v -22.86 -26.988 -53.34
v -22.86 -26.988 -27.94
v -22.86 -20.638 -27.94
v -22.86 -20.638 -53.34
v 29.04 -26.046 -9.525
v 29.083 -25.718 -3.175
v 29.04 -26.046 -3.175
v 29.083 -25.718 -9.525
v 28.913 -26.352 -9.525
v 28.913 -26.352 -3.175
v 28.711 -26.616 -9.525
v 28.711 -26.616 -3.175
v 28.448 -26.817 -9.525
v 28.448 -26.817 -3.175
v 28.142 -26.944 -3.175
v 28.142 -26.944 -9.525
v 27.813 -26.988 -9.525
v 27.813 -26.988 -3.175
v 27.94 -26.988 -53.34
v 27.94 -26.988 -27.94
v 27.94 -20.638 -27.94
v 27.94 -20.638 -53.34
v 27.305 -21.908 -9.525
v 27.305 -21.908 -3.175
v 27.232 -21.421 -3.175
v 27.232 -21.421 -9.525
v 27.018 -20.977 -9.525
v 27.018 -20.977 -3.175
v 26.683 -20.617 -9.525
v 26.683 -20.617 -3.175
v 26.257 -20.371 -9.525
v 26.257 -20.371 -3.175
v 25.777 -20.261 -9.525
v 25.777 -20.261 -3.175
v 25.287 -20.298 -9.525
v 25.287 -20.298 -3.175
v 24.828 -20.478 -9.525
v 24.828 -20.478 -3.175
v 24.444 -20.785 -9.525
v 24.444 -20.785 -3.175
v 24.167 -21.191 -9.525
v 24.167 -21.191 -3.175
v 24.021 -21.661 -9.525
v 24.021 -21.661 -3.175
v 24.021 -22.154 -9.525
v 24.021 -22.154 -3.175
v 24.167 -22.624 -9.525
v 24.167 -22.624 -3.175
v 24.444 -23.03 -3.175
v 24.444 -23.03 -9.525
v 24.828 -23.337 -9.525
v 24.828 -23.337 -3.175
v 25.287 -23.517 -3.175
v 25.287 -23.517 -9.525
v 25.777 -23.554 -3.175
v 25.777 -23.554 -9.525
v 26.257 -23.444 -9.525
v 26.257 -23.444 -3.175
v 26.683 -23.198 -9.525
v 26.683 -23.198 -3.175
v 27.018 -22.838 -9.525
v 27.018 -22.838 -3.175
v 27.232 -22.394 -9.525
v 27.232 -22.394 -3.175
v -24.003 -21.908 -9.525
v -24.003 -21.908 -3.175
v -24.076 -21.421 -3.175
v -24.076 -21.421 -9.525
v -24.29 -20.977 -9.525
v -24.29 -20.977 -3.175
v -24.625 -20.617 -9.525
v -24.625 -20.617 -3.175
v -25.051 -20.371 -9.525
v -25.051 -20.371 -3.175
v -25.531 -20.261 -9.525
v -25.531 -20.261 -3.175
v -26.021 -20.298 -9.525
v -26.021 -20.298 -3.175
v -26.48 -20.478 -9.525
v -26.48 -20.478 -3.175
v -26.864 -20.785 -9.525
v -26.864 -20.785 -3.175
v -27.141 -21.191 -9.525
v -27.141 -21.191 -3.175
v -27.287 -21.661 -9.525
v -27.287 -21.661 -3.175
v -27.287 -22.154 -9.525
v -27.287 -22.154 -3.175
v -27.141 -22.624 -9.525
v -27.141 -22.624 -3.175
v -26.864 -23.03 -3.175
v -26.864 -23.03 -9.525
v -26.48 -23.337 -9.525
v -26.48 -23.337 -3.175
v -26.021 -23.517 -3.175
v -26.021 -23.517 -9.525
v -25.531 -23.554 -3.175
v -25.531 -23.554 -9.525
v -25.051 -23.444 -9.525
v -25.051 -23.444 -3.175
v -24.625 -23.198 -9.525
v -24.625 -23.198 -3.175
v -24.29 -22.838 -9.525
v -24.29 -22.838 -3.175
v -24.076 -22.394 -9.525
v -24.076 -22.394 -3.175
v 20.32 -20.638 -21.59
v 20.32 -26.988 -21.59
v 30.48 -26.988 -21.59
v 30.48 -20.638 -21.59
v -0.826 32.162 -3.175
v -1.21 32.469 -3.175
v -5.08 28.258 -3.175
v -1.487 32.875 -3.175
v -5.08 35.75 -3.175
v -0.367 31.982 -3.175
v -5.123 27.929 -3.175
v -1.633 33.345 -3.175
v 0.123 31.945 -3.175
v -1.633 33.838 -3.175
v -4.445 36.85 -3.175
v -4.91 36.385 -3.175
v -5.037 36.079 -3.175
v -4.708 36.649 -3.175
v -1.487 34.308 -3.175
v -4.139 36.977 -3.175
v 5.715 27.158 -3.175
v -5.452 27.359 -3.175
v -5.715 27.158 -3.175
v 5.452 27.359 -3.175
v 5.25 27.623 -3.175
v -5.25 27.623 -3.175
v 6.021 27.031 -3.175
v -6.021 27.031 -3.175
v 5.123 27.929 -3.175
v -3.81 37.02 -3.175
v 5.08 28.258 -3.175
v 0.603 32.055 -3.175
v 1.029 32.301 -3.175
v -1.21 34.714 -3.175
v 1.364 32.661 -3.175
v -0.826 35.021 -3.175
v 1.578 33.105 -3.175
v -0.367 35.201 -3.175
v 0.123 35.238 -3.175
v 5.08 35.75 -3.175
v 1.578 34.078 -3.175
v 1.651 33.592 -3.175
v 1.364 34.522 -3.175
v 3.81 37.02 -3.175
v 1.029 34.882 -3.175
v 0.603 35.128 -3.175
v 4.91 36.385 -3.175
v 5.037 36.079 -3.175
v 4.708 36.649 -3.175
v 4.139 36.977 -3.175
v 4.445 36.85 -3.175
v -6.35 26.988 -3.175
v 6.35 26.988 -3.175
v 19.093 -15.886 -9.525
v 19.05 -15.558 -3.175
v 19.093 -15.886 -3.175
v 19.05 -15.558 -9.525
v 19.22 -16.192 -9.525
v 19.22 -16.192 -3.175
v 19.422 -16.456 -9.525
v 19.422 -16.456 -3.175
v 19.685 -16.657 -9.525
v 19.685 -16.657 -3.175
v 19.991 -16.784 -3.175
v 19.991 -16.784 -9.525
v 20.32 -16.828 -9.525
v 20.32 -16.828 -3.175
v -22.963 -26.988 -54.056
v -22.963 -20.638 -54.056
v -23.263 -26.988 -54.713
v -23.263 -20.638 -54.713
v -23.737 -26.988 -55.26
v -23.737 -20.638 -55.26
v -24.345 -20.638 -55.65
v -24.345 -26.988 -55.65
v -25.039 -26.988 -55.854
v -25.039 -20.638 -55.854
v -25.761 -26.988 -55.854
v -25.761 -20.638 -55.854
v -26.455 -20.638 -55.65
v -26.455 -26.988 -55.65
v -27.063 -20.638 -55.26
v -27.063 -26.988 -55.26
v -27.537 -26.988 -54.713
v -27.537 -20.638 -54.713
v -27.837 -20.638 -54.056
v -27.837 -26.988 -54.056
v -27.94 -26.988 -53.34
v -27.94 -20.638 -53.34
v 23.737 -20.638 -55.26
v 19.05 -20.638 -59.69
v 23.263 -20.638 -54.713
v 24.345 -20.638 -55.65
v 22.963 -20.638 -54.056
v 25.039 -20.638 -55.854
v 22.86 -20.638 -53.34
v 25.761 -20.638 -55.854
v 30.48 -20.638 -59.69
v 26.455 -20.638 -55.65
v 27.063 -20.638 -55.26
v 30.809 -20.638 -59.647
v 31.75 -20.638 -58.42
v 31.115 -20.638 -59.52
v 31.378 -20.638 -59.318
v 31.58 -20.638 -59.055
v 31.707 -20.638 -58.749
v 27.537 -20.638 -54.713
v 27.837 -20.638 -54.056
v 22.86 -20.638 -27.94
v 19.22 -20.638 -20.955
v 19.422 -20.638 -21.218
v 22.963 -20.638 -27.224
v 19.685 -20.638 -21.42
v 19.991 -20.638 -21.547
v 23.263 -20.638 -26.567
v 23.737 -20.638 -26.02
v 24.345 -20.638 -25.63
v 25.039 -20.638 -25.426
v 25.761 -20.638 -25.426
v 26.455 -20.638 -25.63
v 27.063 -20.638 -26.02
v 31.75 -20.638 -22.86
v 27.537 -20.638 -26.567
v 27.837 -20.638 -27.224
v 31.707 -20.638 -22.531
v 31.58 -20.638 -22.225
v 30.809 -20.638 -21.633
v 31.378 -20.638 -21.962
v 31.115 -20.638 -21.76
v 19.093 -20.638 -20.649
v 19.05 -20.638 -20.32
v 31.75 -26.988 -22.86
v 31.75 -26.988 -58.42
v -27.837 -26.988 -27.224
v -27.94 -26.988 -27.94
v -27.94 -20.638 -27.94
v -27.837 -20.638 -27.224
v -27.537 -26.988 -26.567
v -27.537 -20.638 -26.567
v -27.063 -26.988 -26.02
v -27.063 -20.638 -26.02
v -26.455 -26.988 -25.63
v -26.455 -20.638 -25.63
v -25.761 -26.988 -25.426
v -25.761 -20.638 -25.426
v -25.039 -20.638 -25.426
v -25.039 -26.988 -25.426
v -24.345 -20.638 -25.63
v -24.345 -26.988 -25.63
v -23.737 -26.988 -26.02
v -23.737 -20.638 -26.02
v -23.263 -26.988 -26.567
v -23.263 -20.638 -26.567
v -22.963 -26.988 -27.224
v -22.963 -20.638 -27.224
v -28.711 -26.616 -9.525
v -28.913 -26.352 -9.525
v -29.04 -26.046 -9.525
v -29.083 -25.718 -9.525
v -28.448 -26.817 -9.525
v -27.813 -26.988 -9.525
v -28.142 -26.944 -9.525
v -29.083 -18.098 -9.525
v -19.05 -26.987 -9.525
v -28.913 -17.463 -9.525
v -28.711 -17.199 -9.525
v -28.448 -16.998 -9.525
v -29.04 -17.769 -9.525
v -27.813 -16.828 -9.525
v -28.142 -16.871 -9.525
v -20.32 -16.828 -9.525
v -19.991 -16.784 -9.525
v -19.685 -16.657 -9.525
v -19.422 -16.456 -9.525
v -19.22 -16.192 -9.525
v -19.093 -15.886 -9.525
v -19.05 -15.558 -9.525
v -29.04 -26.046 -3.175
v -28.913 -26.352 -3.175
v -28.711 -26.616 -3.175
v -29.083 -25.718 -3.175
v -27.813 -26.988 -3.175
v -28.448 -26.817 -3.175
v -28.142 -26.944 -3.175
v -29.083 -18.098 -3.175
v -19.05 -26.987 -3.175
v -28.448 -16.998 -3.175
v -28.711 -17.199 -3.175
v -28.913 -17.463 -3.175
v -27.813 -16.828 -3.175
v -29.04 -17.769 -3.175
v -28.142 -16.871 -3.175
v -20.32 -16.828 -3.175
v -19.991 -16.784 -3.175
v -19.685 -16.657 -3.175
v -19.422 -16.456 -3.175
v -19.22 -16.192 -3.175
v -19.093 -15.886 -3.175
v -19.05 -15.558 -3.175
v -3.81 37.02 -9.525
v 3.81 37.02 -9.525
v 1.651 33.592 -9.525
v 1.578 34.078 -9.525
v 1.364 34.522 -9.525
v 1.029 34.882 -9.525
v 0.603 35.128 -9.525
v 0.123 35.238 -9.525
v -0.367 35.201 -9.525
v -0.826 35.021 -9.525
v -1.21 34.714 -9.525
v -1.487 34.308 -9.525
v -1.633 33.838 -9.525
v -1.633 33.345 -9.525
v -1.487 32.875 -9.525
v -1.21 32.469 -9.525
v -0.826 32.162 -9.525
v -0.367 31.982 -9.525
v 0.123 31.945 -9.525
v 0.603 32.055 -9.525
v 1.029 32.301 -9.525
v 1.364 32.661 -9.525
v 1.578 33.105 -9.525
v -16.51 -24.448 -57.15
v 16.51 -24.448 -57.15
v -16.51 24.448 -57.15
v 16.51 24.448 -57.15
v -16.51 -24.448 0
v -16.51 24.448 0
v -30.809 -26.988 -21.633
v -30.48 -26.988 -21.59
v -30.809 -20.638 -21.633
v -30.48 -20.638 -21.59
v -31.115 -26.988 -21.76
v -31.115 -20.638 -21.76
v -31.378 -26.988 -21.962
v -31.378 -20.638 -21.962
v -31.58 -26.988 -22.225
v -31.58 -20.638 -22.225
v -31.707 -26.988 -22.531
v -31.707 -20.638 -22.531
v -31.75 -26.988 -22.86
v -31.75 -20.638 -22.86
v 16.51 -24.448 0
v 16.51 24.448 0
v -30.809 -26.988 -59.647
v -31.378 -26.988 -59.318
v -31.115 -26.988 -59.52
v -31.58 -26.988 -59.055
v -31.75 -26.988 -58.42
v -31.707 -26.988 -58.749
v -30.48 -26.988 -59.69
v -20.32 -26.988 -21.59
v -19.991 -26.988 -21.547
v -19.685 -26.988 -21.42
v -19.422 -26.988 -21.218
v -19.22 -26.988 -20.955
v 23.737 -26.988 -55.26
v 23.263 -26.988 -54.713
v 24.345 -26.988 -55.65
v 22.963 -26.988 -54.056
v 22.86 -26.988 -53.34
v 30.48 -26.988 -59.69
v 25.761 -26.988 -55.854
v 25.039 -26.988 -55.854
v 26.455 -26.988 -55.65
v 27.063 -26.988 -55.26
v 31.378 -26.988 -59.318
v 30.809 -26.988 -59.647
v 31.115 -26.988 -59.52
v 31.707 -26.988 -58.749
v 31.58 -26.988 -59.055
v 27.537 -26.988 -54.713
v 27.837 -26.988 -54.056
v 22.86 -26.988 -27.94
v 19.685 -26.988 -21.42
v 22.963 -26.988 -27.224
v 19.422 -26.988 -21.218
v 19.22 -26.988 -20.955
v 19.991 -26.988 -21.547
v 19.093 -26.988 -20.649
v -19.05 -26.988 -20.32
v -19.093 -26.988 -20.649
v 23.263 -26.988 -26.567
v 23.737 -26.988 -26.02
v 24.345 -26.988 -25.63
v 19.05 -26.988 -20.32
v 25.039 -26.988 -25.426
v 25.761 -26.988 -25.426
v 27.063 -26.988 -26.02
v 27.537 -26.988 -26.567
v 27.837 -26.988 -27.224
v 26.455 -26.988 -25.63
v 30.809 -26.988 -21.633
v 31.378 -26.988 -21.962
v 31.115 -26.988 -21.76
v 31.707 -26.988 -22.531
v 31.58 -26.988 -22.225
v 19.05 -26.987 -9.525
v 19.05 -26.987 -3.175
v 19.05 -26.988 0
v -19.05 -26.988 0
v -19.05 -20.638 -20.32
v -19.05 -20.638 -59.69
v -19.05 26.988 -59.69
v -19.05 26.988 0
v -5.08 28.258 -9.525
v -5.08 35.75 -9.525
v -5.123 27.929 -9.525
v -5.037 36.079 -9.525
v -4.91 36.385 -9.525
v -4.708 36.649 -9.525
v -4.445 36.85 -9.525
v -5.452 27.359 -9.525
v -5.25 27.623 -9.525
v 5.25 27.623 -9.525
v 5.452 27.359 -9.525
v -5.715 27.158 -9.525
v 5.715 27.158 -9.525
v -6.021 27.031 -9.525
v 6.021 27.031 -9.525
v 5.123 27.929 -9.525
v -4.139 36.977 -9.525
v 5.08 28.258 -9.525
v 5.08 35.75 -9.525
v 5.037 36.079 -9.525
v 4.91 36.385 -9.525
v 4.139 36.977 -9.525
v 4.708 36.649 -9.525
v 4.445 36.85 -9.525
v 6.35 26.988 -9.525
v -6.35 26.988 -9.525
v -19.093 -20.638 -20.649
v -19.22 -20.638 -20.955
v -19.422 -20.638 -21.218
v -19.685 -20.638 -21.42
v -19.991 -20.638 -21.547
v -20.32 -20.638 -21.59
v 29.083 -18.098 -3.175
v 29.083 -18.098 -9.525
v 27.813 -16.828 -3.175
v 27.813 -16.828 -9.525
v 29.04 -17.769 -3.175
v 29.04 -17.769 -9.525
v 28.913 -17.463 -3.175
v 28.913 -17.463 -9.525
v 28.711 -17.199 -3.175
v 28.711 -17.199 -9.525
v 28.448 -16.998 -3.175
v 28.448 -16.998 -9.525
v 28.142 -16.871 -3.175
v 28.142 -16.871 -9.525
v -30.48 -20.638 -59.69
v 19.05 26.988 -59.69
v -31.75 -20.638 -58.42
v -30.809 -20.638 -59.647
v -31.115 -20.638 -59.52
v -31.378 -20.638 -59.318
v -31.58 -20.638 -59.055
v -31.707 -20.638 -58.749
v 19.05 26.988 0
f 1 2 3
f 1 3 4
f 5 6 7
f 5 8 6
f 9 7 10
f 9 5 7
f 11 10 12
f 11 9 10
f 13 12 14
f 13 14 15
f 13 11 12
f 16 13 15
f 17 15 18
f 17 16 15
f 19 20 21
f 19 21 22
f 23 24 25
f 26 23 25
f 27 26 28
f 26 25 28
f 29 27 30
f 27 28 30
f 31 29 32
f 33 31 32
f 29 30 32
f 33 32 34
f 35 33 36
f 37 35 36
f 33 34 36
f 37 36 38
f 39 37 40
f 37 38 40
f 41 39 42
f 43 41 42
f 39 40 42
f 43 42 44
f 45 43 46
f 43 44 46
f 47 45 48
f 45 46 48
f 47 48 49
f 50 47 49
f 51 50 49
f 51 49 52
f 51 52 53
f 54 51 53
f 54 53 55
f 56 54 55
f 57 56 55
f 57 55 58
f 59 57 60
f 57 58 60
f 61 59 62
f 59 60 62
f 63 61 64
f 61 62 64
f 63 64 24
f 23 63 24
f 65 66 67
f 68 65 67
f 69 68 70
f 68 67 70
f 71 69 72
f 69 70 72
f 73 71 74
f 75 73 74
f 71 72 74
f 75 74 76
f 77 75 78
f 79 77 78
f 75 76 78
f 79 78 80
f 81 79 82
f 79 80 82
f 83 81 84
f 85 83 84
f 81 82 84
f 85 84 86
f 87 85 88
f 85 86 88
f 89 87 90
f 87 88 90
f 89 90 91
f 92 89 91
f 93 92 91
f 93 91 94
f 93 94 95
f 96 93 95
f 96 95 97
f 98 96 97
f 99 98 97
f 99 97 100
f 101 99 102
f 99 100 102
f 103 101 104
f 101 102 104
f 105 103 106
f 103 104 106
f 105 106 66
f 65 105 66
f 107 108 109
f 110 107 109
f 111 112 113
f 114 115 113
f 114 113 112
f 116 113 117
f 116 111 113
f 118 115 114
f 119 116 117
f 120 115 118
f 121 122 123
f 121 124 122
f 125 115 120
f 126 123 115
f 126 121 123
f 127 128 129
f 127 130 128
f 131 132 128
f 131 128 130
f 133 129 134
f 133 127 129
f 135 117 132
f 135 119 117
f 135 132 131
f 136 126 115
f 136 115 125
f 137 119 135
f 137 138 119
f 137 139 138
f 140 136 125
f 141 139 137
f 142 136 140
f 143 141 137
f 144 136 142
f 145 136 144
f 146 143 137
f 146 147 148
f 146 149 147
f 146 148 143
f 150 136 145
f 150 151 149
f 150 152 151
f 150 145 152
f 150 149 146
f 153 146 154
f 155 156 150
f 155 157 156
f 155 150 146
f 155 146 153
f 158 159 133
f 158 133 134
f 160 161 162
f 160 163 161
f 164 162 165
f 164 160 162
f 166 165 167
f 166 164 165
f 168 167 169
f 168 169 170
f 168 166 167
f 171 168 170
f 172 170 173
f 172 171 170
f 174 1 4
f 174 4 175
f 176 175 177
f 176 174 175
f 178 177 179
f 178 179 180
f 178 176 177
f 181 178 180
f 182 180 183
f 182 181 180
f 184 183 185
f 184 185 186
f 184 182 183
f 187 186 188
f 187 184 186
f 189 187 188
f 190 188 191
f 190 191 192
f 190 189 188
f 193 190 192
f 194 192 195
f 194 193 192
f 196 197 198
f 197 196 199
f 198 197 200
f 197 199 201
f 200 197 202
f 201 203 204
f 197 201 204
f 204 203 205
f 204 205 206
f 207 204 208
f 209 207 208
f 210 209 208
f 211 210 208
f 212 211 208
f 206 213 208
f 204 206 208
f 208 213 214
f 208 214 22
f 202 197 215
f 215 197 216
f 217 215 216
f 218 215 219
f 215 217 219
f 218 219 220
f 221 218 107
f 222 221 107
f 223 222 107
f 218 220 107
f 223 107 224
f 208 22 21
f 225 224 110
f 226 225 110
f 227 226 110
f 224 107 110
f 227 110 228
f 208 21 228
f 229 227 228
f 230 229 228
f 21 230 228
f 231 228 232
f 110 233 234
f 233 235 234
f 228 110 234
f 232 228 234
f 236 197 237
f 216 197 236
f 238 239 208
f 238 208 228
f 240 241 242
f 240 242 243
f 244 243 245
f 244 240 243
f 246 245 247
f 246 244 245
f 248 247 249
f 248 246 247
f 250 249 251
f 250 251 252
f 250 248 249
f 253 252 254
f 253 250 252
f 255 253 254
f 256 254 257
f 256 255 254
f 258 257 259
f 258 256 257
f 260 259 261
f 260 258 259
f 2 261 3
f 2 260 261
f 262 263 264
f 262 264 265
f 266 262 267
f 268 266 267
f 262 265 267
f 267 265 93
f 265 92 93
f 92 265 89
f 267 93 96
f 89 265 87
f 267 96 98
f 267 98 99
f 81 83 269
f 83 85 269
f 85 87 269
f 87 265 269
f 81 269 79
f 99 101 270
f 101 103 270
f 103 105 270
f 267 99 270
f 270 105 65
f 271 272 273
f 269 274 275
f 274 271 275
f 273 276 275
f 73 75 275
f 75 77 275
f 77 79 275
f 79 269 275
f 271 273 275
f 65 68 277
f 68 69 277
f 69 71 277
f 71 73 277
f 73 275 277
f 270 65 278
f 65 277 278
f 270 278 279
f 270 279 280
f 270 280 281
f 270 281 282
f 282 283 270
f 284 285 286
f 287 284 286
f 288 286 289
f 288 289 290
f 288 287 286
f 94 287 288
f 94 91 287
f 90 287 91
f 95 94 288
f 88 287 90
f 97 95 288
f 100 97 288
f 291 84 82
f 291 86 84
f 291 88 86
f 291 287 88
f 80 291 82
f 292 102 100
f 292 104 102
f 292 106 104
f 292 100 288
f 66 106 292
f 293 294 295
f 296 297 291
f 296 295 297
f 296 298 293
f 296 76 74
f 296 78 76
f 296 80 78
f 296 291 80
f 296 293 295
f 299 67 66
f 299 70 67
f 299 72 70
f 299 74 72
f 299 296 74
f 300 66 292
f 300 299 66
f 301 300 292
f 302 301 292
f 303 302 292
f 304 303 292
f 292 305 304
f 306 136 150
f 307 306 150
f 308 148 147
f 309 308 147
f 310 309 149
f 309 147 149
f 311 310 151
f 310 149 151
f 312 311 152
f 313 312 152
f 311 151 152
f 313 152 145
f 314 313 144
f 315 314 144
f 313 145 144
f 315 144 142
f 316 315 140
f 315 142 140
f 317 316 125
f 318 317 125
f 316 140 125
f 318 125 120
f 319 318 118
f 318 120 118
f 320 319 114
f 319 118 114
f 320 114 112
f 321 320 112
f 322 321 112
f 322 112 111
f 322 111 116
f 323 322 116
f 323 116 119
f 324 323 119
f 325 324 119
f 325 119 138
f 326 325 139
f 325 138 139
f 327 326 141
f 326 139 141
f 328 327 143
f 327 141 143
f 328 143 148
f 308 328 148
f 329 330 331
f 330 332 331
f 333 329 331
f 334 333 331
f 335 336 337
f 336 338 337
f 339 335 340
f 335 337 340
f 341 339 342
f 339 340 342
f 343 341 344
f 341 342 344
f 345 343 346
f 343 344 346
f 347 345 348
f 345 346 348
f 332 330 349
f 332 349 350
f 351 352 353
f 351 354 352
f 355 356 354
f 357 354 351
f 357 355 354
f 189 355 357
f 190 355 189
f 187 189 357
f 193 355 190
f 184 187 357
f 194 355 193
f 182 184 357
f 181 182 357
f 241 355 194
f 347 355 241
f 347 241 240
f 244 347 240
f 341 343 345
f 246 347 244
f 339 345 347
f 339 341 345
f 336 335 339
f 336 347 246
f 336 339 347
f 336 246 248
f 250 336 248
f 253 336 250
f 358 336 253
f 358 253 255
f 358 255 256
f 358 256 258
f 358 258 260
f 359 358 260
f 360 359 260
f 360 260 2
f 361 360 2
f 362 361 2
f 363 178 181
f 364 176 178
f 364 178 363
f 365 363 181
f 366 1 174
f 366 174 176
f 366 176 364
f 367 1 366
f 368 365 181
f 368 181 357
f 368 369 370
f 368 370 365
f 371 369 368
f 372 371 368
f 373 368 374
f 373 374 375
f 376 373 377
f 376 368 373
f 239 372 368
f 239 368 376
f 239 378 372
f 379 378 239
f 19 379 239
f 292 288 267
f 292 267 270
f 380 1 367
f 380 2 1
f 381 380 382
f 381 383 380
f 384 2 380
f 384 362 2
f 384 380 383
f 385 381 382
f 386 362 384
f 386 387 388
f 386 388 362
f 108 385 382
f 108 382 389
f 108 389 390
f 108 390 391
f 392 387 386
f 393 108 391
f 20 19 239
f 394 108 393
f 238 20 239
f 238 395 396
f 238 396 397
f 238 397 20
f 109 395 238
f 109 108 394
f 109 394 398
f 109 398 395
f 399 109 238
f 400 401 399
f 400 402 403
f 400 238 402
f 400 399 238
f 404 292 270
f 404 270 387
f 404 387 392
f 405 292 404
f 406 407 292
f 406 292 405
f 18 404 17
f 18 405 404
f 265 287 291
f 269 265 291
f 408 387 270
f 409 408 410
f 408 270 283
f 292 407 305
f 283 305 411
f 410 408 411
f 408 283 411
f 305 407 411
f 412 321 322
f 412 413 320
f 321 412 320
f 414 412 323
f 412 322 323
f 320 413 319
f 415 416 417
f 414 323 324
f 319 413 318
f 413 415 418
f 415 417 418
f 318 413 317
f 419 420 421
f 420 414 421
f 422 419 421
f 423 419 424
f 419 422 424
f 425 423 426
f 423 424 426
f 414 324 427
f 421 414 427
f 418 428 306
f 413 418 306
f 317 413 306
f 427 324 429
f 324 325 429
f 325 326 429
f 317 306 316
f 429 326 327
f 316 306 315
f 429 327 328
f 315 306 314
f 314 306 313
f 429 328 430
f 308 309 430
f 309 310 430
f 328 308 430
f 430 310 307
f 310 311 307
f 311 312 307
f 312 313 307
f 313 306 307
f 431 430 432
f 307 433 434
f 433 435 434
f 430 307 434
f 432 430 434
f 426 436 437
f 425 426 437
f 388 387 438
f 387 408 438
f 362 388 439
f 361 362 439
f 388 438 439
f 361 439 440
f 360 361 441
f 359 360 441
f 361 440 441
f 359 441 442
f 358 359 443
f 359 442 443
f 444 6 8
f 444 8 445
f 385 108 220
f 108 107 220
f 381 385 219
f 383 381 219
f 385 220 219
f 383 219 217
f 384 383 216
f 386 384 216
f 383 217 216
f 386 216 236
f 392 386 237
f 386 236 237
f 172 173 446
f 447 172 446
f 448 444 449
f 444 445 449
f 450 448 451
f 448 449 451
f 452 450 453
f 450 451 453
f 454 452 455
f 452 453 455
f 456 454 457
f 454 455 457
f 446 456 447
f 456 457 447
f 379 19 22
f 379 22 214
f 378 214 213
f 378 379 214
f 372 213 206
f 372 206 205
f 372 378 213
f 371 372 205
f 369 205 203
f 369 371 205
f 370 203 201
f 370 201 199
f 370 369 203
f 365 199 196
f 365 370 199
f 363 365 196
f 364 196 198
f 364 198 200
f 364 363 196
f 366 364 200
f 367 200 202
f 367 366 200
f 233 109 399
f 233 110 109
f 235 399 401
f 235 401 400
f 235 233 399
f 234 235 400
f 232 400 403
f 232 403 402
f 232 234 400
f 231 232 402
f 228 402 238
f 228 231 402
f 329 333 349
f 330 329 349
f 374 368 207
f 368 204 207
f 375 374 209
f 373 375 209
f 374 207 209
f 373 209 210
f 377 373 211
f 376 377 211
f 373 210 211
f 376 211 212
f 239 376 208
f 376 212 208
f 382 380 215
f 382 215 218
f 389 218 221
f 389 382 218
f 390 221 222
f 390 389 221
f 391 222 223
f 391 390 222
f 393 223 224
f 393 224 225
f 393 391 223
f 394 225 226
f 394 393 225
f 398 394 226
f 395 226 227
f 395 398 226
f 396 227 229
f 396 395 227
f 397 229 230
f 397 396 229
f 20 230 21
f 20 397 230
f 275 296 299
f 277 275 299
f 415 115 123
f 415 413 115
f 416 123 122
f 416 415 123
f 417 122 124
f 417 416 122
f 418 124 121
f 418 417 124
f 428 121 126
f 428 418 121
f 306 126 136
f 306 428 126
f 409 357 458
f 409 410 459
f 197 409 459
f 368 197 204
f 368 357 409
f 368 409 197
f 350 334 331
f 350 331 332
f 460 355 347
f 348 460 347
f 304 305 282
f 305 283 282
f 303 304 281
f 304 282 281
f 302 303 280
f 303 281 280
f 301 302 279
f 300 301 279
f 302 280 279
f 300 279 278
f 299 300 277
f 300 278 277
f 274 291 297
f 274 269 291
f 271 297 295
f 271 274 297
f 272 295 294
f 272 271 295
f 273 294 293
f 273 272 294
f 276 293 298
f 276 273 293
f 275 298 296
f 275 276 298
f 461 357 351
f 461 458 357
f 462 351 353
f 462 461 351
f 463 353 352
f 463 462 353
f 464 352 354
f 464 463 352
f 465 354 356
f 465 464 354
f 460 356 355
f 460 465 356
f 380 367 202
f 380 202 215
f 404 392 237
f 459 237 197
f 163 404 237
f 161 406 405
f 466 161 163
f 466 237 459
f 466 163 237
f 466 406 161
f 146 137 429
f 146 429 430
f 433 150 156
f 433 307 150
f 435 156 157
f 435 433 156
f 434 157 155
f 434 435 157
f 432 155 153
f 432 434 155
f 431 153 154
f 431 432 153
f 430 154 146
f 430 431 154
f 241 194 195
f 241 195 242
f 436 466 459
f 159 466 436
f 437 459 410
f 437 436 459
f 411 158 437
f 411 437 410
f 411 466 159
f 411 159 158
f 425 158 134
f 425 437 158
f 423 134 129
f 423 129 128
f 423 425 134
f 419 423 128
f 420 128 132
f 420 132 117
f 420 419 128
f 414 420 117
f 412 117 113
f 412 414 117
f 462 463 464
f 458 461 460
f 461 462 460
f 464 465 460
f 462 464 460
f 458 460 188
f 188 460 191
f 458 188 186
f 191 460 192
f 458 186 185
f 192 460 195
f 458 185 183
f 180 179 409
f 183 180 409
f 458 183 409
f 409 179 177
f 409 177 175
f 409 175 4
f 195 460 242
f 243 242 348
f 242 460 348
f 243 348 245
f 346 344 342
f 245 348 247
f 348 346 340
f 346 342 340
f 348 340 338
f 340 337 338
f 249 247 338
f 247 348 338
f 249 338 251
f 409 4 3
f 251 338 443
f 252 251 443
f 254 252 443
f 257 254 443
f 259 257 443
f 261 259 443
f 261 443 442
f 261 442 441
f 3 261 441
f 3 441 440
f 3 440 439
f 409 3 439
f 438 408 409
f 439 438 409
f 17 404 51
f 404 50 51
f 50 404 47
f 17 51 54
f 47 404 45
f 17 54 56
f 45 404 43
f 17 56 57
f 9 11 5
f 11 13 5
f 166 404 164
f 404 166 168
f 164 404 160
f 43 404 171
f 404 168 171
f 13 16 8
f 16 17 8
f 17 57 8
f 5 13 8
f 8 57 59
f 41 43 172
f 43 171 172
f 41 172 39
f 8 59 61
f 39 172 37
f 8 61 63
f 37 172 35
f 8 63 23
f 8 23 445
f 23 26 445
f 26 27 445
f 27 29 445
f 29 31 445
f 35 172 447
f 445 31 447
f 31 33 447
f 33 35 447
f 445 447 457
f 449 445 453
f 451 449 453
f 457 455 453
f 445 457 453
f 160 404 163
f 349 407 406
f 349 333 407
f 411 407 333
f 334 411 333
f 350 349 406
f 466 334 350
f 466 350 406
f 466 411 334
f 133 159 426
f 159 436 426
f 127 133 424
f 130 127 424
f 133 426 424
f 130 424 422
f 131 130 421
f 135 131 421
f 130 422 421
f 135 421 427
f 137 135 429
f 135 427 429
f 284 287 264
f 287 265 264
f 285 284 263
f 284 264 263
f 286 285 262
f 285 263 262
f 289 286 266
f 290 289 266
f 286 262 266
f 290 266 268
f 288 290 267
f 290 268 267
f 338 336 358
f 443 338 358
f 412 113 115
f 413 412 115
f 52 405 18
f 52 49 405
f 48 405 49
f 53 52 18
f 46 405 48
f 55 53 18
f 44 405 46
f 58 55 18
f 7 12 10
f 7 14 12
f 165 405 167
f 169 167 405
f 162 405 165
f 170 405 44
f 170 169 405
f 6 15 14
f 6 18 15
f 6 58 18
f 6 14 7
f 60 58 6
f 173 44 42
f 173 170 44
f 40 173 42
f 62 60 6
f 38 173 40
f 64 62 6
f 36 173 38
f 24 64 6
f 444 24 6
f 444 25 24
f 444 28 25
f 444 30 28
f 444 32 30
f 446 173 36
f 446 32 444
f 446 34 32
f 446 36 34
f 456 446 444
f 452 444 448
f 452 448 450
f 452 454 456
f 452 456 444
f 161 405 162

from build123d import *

# Parameters (mm, degrees)
SKETCH1_W           = 38.1
SKETCH1_H           = 53.975
SKETCH1_W_2         = 33.02
SKETCH1_H_2         = 48.895
BOSS_EXTRUDE1_DEPTH = 57.15
SKETCH2_W           = 38.1
SKETCH2_H           = 53.975
BOSS_EXTRUDE2_DEPTH = 2.54
SKETCH3_W           = 10.033
SKETCH3_H           = 10.16
SKETCH3_R           = 1.651
SKETCH3_W_2         = 10.16
SKETCH3_H_2         = 10.033
BOSS_EXTRUDE3_DEPTH = 6.35
SKETCH4_W           = 12.7
SKETCH4_H           = 38.1
BOSS_EXTRUDE4_DEPTH = 6.35
FILLET1_R           = 1.27


with BuildPart() as part:
    # Sketch1 → Boss-Extrude1 (new body)
    with BuildSketch(Plane.XY):
        Rectangle(SKETCH1_W, SKETCH1_H)
        Rectangle(SKETCH1_W_2, SKETCH1_H_2, mode=Mode.SUBTRACT)
    extrude(amount=-BOSS_EXTRUDE1_DEPTH)

    # Sketch2 → Boss-Extrude2 (add)
    with BuildSketch(Plane(origin=(0, 0, -57.15), x_dir=(-1, 0, 0), z_dir=(0, 0, -1))):
        Rectangle(SKETCH2_W, SKETCH2_H)
    extrude(amount=BOSS_EXTRUDE2_DEPTH)

    # Sketch3 → Boss-Extrude3 (add)
    # profile 1 of 3: a face of its own
    with BuildSketch(Plane.XY.offset(-3.175)):
        with Locations((-24.0665, -21.9075)):
            Rectangle(SKETCH3_W, SKETCH3_H)
        with Locations((-25.654, -21.9075)):
            Circle(SKETCH3_R, mode=Mode.SUBTRACT)
    # profile 2 of 3: a face of its own
    with BuildSketch(Plane.XY.offset(-3.175)):
        with Locations((24.0665, -21.9075)):
            Rectangle(SKETCH3_W, SKETCH3_H)
        with Locations((25.654, -21.9075)):
            Circle(SKETCH3_R, mode=Mode.SUBTRACT)
    # profile 3 of 3: a face of its own
    with BuildSketch(Plane.XY.offset(-3.175)):
        with Locations((0, 32.004)):
            Rectangle(SKETCH3_W_2, SKETCH3_H_2)
        with Locations((0, 33.5915)):
            Circle(SKETCH3_R, mode=Mode.SUBTRACT)
    extrude(amount=-BOSS_EXTRUDE3_DEPTH)

    # Sketch4 → Boss-Extrude4 (add)
    # profile 1 of 2: a face of its own
    with BuildSketch(Plane.XZ.offset(26.9875)):
        with Locations((25.4, -40.64)):
            Rectangle(SKETCH4_W, SKETCH4_H)
        with BuildLine():
            ThreePointArc((27.94, -53.34), (25.4, -55.88), (22.86, -53.34))
            Line((22.86, -53.34), (22.86, -27.94))
            ThreePointArc((22.86, -27.94), (25.4, -25.4), (27.94, -27.94))
            Line((27.94, -27.94), (27.94, -53.34))
        make_face(mode=Mode.SUBTRACT)
    # profile 2 of 2: a face of its own
    with BuildSketch(Plane.XZ.offset(26.9875)):
        with Locations((-25.4, -40.64)):
            Rectangle(SKETCH4_W, SKETCH4_H)
        with BuildLine():
            Line((-22.86, -27.94), (-22.86, -53.34))
            ThreePointArc((-22.86, -53.34), (-25.4, -55.88), (-27.94, -53.34))
            Line((-27.94, -53.34), (-27.94, -27.94))
            ThreePointArc((-27.94, -27.94), (-25.4, -25.4), (-22.86, -27.94))
        make_face(mode=Mode.SUBTRACT)
    extrude(amount=-BOSS_EXTRUDE4_DEPTH)

    # Fillet1
    fillet1_edges = [part.edges().sort_by_distance(p)[0] for p in [
        (-31.75, -23.8125, -59.69),
        (-31.75, -23.8125, -21.59),
        (-19.05, -23.8125, -21.59),
        (-29.083, -26.9875, -6.35),
        (-29.083, -16.8275, -6.35),
        (-19.05, -16.8275, -6.35),
        (19.05, -16.8275, -6.35),
        (29.083, -16.8275, -6.35),
        (29.083, -26.9875, -6.35),
        (5.08, 26.9875, -6.35),
        (-5.08, 26.9875, -6.35),
        (-5.08, 37.0205, -6.35),
        (5.08, 37.0205, -6.35),
        (31.75, -23.8125, -59.69),
        (19.05, -23.8125, -21.59),
        (31.75, -23.8125, -21.59),
    ]]
    fillet(fillet1_edges, radius=FILLET1_R)


solid = part.part
